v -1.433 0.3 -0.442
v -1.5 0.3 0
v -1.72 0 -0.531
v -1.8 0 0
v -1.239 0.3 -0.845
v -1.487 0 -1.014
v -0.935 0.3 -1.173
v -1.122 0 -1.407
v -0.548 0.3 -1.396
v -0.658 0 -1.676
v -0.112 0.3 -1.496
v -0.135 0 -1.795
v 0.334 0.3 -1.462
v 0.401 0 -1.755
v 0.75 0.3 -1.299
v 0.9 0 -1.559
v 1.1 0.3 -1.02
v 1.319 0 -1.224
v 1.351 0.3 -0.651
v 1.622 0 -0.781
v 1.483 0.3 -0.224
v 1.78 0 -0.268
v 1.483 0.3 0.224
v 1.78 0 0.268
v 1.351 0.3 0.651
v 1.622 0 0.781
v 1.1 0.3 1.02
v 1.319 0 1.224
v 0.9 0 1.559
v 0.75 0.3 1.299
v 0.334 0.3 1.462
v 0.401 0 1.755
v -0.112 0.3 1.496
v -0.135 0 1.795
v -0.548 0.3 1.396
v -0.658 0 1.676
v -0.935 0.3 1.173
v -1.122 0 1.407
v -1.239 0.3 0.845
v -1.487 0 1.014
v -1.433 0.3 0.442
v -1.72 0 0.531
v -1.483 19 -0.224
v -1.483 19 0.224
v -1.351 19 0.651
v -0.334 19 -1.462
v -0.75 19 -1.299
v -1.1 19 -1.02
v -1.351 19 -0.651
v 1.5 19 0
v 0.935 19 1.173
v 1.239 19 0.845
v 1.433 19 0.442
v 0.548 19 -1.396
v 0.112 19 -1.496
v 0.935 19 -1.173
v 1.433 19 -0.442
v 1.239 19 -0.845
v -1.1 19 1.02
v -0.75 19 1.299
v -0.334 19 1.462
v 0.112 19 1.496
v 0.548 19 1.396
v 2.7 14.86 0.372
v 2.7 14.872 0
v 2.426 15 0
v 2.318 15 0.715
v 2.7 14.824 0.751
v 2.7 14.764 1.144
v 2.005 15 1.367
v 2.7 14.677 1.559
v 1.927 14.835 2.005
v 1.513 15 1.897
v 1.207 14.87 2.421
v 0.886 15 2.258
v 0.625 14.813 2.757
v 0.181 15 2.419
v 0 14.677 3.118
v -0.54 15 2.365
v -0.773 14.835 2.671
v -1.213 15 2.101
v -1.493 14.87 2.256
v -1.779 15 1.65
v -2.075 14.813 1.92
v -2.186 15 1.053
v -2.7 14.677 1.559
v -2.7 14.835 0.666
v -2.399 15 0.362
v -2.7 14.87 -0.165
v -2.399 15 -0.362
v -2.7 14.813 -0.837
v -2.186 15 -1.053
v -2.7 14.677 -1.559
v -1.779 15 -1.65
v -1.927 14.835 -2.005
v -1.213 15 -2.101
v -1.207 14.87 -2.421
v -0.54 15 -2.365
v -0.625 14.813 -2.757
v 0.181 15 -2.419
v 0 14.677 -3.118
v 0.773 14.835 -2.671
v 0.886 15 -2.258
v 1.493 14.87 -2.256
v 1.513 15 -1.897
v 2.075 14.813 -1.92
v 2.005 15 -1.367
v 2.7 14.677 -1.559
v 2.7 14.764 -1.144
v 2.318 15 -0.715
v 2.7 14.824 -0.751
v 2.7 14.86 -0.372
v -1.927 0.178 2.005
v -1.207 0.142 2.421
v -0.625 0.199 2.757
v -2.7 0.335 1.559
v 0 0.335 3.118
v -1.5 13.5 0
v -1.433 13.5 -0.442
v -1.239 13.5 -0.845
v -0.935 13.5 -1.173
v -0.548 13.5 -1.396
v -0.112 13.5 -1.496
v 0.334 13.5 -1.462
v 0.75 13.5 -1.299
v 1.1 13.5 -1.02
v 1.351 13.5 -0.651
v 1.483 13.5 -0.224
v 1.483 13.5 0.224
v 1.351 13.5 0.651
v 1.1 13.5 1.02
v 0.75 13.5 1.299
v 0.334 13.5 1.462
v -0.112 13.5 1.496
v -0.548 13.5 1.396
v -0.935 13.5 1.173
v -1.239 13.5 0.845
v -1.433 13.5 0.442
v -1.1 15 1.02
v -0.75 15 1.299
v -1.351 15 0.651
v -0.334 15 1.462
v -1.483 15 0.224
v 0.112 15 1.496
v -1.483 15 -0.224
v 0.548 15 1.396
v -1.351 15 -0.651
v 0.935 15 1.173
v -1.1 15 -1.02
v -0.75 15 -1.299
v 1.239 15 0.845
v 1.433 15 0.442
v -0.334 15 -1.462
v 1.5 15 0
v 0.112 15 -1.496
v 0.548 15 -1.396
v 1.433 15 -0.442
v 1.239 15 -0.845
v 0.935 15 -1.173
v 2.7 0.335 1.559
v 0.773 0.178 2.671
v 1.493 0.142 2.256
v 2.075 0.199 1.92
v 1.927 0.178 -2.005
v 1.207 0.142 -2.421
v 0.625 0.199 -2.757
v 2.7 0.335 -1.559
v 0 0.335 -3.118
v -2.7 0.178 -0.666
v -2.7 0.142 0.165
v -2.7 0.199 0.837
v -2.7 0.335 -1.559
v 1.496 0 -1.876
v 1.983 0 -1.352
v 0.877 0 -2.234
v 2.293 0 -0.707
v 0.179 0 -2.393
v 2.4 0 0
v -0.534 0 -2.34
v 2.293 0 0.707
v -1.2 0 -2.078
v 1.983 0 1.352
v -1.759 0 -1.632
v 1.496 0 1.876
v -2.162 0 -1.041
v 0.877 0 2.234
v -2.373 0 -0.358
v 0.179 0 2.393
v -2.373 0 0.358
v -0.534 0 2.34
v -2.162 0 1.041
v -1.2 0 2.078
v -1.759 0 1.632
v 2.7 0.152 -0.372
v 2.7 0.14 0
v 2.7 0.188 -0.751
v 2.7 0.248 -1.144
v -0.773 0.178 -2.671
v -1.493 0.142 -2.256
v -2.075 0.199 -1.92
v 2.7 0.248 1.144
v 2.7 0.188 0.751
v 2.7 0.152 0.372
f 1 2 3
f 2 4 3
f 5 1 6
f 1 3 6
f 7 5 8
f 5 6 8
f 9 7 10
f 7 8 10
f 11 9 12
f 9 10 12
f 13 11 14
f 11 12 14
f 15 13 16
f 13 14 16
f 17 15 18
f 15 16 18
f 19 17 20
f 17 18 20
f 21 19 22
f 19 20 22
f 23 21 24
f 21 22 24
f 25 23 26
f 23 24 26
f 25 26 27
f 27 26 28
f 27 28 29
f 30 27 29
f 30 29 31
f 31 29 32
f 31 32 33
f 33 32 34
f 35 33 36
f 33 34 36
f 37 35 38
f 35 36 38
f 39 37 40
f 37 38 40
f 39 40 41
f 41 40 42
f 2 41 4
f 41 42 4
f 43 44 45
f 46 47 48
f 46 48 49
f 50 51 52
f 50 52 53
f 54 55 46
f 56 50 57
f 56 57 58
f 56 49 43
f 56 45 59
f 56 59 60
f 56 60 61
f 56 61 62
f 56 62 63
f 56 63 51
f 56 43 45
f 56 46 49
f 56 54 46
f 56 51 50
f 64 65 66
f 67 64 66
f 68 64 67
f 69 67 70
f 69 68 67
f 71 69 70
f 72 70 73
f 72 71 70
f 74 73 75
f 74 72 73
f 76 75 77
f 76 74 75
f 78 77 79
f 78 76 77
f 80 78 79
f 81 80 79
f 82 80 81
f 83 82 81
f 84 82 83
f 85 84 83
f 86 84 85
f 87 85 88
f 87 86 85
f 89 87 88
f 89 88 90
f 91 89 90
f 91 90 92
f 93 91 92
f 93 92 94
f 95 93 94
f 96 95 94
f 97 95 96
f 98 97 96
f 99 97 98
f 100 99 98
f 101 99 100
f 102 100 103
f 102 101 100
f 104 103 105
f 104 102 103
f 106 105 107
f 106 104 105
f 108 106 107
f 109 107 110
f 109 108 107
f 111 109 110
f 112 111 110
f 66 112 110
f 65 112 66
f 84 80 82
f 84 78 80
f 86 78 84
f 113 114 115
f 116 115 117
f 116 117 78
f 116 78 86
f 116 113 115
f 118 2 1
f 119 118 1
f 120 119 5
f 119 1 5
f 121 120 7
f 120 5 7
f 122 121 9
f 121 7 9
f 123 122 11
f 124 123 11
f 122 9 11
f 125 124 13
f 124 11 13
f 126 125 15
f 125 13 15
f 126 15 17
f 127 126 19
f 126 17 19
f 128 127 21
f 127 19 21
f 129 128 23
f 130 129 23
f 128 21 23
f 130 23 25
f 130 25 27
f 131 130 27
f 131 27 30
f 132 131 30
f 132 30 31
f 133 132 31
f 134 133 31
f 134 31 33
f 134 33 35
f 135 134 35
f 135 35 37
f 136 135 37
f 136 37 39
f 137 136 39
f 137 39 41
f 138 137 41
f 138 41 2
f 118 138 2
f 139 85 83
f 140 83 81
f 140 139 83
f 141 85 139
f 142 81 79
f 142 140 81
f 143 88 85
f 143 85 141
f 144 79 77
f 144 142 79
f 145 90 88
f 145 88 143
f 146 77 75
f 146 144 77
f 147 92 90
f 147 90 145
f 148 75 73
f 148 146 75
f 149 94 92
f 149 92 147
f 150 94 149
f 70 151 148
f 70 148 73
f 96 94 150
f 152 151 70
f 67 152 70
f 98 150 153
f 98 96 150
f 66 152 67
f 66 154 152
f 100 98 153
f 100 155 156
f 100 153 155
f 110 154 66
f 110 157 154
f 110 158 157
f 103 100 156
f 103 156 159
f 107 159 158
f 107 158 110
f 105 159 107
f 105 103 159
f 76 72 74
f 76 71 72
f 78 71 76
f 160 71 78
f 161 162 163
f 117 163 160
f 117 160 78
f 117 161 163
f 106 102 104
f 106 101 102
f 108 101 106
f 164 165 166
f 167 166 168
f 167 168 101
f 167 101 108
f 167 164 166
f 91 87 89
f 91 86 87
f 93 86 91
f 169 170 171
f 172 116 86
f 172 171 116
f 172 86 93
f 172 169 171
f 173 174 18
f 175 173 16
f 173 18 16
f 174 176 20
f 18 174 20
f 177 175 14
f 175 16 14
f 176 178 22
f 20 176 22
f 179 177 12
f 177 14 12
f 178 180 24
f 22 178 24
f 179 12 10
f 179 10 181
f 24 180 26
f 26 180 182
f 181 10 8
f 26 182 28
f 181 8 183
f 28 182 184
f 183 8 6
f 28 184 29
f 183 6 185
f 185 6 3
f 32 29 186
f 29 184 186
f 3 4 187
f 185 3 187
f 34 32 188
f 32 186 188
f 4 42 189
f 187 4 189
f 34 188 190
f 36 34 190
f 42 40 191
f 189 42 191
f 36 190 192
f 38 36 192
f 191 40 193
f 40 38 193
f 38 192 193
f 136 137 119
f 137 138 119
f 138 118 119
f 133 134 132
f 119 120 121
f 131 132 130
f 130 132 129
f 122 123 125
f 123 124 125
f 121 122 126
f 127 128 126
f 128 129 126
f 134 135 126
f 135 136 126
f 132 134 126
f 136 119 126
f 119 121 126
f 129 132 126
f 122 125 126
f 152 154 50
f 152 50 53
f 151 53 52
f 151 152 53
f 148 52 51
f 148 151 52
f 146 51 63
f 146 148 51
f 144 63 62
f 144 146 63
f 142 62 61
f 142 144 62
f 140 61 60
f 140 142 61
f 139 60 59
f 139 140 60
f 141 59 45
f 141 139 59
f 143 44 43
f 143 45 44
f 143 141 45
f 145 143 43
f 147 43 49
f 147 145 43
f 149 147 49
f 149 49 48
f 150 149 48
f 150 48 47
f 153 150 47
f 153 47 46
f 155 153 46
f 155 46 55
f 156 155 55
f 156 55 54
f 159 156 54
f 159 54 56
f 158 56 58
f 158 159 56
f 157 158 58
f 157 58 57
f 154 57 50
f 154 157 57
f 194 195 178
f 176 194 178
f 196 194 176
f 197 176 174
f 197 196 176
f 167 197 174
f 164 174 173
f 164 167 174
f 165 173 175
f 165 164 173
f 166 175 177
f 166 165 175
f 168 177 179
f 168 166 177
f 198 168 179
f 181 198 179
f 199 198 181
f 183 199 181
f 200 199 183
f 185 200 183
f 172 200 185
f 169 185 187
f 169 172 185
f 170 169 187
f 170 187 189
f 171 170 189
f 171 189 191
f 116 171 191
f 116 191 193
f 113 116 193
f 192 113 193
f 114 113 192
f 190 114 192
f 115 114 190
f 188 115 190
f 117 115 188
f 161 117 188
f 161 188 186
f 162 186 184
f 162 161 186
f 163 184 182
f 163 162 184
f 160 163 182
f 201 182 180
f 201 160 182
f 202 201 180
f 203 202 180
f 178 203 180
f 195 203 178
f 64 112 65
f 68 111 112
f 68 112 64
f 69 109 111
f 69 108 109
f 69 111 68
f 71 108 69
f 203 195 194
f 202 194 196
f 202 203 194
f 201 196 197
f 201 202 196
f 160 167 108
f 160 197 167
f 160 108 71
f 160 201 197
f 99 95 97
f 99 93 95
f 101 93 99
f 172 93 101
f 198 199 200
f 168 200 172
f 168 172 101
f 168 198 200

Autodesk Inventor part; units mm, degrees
ref_plane "YZ Plane" through (0, 0, 0) normal (1, 0, 0) x (0, 1, 0)
ref_plane "XZ Plane" through (0, 0, 0) normal (0, 1, 0) x (-1, 0, 0)
ref_plane "XY Plane" through (0, 0, 0) normal (0, 0, 1) x (1, 0, 0)
sketch "Esboço2" plane through (0, 0, 0) normal (0, 1, 0) x (-1, 0, 0)
  circle A0 centre (0, 0) radius 1.5
  line L0 (2.7, -1.5588) -> (0, -3.1177)
  line L1 (0, -3.1177) -> (-2.7, -1.5588)
  line L2 (-2.7, -1.5588) -> (-2.7, 1.5588)
  line L3 (-2.7, 1.5588) -> (0, 3.1177)
  line L4 (0, 3.1177) -> (2.7, 1.5588)
  line L5 (2.7, 1.5588) -> (2.7, -1.5588)
extrude "Extrusão1" add sketch "Esboço2" along normal blind 15
thread "Rosca1" size "M3x0.5" class "6H" standard "ANSI Metric M Profile" full length
chamfer "Chanfro1" distance 0.3 angle 45 2 edges at (1.5, 15, 0) (1.5, 0, 0)
sketch "Esboço3" plane through (0, 0, 0) normal (0, 0, 1) x (1, 0, 0)
  line L0 (0, -0.48) -> (0, 2.88) projected
  line L1 (2.4, 0) -> (4.5158, 0.9866)
  line L2 (2.4, 0) -> (4.5158, 0.9866)
  line L3 (4.5158, 0.9866) -> (4.5158, 0)
  line L4 (4.5158, 0.9866) -> (2.4, 0)
  line L5 (2.4, 0) -> (4.5158, 0)
  line L6 (2.7, 0) -> (0, 0) projected
  line L7 (2.4, 2.4) -> (2.4, 15.0122)
  line L8 (4.5158, 15.0122) -> (2.4, 15.0122)
  line L9 (4.5158, 15.0122) -> (4.5158, 14.0252)
  line L10 (4.5158, 14.0252) -> (2.4, 15.0122)
  dimension "d19" = 0.987
revolve "Revolução3" cut sketch "Esboço3" angle 360 about axis through (0, -10, 0) along (0, 1, 0)
sketch "Esboço4" plane through (0, 15, 0) normal (0, 1, 0) x (1, 0, 0)
  circle A0 centre (0, 0) radius 2.4262
extrude "Extrusão2" add sketch "Esboço4" against normal blind 1.5
sketch "Esboço5" plane through (0, 15, 0) normal (0, 1, 0) x (1, 0, 0)
  circle A0 centre (0, 0) radius 1.5
  dimension "d23" = 3
extrude "Extrusão3" add sketch "Esboço5" along normal blind 4
thread "Rosca2" size "M3x0.5" class "6g" standard "ANSI Metric M Profile" full length
properties part number "espaçador 15mm m3" material "Aço galvanizado"
